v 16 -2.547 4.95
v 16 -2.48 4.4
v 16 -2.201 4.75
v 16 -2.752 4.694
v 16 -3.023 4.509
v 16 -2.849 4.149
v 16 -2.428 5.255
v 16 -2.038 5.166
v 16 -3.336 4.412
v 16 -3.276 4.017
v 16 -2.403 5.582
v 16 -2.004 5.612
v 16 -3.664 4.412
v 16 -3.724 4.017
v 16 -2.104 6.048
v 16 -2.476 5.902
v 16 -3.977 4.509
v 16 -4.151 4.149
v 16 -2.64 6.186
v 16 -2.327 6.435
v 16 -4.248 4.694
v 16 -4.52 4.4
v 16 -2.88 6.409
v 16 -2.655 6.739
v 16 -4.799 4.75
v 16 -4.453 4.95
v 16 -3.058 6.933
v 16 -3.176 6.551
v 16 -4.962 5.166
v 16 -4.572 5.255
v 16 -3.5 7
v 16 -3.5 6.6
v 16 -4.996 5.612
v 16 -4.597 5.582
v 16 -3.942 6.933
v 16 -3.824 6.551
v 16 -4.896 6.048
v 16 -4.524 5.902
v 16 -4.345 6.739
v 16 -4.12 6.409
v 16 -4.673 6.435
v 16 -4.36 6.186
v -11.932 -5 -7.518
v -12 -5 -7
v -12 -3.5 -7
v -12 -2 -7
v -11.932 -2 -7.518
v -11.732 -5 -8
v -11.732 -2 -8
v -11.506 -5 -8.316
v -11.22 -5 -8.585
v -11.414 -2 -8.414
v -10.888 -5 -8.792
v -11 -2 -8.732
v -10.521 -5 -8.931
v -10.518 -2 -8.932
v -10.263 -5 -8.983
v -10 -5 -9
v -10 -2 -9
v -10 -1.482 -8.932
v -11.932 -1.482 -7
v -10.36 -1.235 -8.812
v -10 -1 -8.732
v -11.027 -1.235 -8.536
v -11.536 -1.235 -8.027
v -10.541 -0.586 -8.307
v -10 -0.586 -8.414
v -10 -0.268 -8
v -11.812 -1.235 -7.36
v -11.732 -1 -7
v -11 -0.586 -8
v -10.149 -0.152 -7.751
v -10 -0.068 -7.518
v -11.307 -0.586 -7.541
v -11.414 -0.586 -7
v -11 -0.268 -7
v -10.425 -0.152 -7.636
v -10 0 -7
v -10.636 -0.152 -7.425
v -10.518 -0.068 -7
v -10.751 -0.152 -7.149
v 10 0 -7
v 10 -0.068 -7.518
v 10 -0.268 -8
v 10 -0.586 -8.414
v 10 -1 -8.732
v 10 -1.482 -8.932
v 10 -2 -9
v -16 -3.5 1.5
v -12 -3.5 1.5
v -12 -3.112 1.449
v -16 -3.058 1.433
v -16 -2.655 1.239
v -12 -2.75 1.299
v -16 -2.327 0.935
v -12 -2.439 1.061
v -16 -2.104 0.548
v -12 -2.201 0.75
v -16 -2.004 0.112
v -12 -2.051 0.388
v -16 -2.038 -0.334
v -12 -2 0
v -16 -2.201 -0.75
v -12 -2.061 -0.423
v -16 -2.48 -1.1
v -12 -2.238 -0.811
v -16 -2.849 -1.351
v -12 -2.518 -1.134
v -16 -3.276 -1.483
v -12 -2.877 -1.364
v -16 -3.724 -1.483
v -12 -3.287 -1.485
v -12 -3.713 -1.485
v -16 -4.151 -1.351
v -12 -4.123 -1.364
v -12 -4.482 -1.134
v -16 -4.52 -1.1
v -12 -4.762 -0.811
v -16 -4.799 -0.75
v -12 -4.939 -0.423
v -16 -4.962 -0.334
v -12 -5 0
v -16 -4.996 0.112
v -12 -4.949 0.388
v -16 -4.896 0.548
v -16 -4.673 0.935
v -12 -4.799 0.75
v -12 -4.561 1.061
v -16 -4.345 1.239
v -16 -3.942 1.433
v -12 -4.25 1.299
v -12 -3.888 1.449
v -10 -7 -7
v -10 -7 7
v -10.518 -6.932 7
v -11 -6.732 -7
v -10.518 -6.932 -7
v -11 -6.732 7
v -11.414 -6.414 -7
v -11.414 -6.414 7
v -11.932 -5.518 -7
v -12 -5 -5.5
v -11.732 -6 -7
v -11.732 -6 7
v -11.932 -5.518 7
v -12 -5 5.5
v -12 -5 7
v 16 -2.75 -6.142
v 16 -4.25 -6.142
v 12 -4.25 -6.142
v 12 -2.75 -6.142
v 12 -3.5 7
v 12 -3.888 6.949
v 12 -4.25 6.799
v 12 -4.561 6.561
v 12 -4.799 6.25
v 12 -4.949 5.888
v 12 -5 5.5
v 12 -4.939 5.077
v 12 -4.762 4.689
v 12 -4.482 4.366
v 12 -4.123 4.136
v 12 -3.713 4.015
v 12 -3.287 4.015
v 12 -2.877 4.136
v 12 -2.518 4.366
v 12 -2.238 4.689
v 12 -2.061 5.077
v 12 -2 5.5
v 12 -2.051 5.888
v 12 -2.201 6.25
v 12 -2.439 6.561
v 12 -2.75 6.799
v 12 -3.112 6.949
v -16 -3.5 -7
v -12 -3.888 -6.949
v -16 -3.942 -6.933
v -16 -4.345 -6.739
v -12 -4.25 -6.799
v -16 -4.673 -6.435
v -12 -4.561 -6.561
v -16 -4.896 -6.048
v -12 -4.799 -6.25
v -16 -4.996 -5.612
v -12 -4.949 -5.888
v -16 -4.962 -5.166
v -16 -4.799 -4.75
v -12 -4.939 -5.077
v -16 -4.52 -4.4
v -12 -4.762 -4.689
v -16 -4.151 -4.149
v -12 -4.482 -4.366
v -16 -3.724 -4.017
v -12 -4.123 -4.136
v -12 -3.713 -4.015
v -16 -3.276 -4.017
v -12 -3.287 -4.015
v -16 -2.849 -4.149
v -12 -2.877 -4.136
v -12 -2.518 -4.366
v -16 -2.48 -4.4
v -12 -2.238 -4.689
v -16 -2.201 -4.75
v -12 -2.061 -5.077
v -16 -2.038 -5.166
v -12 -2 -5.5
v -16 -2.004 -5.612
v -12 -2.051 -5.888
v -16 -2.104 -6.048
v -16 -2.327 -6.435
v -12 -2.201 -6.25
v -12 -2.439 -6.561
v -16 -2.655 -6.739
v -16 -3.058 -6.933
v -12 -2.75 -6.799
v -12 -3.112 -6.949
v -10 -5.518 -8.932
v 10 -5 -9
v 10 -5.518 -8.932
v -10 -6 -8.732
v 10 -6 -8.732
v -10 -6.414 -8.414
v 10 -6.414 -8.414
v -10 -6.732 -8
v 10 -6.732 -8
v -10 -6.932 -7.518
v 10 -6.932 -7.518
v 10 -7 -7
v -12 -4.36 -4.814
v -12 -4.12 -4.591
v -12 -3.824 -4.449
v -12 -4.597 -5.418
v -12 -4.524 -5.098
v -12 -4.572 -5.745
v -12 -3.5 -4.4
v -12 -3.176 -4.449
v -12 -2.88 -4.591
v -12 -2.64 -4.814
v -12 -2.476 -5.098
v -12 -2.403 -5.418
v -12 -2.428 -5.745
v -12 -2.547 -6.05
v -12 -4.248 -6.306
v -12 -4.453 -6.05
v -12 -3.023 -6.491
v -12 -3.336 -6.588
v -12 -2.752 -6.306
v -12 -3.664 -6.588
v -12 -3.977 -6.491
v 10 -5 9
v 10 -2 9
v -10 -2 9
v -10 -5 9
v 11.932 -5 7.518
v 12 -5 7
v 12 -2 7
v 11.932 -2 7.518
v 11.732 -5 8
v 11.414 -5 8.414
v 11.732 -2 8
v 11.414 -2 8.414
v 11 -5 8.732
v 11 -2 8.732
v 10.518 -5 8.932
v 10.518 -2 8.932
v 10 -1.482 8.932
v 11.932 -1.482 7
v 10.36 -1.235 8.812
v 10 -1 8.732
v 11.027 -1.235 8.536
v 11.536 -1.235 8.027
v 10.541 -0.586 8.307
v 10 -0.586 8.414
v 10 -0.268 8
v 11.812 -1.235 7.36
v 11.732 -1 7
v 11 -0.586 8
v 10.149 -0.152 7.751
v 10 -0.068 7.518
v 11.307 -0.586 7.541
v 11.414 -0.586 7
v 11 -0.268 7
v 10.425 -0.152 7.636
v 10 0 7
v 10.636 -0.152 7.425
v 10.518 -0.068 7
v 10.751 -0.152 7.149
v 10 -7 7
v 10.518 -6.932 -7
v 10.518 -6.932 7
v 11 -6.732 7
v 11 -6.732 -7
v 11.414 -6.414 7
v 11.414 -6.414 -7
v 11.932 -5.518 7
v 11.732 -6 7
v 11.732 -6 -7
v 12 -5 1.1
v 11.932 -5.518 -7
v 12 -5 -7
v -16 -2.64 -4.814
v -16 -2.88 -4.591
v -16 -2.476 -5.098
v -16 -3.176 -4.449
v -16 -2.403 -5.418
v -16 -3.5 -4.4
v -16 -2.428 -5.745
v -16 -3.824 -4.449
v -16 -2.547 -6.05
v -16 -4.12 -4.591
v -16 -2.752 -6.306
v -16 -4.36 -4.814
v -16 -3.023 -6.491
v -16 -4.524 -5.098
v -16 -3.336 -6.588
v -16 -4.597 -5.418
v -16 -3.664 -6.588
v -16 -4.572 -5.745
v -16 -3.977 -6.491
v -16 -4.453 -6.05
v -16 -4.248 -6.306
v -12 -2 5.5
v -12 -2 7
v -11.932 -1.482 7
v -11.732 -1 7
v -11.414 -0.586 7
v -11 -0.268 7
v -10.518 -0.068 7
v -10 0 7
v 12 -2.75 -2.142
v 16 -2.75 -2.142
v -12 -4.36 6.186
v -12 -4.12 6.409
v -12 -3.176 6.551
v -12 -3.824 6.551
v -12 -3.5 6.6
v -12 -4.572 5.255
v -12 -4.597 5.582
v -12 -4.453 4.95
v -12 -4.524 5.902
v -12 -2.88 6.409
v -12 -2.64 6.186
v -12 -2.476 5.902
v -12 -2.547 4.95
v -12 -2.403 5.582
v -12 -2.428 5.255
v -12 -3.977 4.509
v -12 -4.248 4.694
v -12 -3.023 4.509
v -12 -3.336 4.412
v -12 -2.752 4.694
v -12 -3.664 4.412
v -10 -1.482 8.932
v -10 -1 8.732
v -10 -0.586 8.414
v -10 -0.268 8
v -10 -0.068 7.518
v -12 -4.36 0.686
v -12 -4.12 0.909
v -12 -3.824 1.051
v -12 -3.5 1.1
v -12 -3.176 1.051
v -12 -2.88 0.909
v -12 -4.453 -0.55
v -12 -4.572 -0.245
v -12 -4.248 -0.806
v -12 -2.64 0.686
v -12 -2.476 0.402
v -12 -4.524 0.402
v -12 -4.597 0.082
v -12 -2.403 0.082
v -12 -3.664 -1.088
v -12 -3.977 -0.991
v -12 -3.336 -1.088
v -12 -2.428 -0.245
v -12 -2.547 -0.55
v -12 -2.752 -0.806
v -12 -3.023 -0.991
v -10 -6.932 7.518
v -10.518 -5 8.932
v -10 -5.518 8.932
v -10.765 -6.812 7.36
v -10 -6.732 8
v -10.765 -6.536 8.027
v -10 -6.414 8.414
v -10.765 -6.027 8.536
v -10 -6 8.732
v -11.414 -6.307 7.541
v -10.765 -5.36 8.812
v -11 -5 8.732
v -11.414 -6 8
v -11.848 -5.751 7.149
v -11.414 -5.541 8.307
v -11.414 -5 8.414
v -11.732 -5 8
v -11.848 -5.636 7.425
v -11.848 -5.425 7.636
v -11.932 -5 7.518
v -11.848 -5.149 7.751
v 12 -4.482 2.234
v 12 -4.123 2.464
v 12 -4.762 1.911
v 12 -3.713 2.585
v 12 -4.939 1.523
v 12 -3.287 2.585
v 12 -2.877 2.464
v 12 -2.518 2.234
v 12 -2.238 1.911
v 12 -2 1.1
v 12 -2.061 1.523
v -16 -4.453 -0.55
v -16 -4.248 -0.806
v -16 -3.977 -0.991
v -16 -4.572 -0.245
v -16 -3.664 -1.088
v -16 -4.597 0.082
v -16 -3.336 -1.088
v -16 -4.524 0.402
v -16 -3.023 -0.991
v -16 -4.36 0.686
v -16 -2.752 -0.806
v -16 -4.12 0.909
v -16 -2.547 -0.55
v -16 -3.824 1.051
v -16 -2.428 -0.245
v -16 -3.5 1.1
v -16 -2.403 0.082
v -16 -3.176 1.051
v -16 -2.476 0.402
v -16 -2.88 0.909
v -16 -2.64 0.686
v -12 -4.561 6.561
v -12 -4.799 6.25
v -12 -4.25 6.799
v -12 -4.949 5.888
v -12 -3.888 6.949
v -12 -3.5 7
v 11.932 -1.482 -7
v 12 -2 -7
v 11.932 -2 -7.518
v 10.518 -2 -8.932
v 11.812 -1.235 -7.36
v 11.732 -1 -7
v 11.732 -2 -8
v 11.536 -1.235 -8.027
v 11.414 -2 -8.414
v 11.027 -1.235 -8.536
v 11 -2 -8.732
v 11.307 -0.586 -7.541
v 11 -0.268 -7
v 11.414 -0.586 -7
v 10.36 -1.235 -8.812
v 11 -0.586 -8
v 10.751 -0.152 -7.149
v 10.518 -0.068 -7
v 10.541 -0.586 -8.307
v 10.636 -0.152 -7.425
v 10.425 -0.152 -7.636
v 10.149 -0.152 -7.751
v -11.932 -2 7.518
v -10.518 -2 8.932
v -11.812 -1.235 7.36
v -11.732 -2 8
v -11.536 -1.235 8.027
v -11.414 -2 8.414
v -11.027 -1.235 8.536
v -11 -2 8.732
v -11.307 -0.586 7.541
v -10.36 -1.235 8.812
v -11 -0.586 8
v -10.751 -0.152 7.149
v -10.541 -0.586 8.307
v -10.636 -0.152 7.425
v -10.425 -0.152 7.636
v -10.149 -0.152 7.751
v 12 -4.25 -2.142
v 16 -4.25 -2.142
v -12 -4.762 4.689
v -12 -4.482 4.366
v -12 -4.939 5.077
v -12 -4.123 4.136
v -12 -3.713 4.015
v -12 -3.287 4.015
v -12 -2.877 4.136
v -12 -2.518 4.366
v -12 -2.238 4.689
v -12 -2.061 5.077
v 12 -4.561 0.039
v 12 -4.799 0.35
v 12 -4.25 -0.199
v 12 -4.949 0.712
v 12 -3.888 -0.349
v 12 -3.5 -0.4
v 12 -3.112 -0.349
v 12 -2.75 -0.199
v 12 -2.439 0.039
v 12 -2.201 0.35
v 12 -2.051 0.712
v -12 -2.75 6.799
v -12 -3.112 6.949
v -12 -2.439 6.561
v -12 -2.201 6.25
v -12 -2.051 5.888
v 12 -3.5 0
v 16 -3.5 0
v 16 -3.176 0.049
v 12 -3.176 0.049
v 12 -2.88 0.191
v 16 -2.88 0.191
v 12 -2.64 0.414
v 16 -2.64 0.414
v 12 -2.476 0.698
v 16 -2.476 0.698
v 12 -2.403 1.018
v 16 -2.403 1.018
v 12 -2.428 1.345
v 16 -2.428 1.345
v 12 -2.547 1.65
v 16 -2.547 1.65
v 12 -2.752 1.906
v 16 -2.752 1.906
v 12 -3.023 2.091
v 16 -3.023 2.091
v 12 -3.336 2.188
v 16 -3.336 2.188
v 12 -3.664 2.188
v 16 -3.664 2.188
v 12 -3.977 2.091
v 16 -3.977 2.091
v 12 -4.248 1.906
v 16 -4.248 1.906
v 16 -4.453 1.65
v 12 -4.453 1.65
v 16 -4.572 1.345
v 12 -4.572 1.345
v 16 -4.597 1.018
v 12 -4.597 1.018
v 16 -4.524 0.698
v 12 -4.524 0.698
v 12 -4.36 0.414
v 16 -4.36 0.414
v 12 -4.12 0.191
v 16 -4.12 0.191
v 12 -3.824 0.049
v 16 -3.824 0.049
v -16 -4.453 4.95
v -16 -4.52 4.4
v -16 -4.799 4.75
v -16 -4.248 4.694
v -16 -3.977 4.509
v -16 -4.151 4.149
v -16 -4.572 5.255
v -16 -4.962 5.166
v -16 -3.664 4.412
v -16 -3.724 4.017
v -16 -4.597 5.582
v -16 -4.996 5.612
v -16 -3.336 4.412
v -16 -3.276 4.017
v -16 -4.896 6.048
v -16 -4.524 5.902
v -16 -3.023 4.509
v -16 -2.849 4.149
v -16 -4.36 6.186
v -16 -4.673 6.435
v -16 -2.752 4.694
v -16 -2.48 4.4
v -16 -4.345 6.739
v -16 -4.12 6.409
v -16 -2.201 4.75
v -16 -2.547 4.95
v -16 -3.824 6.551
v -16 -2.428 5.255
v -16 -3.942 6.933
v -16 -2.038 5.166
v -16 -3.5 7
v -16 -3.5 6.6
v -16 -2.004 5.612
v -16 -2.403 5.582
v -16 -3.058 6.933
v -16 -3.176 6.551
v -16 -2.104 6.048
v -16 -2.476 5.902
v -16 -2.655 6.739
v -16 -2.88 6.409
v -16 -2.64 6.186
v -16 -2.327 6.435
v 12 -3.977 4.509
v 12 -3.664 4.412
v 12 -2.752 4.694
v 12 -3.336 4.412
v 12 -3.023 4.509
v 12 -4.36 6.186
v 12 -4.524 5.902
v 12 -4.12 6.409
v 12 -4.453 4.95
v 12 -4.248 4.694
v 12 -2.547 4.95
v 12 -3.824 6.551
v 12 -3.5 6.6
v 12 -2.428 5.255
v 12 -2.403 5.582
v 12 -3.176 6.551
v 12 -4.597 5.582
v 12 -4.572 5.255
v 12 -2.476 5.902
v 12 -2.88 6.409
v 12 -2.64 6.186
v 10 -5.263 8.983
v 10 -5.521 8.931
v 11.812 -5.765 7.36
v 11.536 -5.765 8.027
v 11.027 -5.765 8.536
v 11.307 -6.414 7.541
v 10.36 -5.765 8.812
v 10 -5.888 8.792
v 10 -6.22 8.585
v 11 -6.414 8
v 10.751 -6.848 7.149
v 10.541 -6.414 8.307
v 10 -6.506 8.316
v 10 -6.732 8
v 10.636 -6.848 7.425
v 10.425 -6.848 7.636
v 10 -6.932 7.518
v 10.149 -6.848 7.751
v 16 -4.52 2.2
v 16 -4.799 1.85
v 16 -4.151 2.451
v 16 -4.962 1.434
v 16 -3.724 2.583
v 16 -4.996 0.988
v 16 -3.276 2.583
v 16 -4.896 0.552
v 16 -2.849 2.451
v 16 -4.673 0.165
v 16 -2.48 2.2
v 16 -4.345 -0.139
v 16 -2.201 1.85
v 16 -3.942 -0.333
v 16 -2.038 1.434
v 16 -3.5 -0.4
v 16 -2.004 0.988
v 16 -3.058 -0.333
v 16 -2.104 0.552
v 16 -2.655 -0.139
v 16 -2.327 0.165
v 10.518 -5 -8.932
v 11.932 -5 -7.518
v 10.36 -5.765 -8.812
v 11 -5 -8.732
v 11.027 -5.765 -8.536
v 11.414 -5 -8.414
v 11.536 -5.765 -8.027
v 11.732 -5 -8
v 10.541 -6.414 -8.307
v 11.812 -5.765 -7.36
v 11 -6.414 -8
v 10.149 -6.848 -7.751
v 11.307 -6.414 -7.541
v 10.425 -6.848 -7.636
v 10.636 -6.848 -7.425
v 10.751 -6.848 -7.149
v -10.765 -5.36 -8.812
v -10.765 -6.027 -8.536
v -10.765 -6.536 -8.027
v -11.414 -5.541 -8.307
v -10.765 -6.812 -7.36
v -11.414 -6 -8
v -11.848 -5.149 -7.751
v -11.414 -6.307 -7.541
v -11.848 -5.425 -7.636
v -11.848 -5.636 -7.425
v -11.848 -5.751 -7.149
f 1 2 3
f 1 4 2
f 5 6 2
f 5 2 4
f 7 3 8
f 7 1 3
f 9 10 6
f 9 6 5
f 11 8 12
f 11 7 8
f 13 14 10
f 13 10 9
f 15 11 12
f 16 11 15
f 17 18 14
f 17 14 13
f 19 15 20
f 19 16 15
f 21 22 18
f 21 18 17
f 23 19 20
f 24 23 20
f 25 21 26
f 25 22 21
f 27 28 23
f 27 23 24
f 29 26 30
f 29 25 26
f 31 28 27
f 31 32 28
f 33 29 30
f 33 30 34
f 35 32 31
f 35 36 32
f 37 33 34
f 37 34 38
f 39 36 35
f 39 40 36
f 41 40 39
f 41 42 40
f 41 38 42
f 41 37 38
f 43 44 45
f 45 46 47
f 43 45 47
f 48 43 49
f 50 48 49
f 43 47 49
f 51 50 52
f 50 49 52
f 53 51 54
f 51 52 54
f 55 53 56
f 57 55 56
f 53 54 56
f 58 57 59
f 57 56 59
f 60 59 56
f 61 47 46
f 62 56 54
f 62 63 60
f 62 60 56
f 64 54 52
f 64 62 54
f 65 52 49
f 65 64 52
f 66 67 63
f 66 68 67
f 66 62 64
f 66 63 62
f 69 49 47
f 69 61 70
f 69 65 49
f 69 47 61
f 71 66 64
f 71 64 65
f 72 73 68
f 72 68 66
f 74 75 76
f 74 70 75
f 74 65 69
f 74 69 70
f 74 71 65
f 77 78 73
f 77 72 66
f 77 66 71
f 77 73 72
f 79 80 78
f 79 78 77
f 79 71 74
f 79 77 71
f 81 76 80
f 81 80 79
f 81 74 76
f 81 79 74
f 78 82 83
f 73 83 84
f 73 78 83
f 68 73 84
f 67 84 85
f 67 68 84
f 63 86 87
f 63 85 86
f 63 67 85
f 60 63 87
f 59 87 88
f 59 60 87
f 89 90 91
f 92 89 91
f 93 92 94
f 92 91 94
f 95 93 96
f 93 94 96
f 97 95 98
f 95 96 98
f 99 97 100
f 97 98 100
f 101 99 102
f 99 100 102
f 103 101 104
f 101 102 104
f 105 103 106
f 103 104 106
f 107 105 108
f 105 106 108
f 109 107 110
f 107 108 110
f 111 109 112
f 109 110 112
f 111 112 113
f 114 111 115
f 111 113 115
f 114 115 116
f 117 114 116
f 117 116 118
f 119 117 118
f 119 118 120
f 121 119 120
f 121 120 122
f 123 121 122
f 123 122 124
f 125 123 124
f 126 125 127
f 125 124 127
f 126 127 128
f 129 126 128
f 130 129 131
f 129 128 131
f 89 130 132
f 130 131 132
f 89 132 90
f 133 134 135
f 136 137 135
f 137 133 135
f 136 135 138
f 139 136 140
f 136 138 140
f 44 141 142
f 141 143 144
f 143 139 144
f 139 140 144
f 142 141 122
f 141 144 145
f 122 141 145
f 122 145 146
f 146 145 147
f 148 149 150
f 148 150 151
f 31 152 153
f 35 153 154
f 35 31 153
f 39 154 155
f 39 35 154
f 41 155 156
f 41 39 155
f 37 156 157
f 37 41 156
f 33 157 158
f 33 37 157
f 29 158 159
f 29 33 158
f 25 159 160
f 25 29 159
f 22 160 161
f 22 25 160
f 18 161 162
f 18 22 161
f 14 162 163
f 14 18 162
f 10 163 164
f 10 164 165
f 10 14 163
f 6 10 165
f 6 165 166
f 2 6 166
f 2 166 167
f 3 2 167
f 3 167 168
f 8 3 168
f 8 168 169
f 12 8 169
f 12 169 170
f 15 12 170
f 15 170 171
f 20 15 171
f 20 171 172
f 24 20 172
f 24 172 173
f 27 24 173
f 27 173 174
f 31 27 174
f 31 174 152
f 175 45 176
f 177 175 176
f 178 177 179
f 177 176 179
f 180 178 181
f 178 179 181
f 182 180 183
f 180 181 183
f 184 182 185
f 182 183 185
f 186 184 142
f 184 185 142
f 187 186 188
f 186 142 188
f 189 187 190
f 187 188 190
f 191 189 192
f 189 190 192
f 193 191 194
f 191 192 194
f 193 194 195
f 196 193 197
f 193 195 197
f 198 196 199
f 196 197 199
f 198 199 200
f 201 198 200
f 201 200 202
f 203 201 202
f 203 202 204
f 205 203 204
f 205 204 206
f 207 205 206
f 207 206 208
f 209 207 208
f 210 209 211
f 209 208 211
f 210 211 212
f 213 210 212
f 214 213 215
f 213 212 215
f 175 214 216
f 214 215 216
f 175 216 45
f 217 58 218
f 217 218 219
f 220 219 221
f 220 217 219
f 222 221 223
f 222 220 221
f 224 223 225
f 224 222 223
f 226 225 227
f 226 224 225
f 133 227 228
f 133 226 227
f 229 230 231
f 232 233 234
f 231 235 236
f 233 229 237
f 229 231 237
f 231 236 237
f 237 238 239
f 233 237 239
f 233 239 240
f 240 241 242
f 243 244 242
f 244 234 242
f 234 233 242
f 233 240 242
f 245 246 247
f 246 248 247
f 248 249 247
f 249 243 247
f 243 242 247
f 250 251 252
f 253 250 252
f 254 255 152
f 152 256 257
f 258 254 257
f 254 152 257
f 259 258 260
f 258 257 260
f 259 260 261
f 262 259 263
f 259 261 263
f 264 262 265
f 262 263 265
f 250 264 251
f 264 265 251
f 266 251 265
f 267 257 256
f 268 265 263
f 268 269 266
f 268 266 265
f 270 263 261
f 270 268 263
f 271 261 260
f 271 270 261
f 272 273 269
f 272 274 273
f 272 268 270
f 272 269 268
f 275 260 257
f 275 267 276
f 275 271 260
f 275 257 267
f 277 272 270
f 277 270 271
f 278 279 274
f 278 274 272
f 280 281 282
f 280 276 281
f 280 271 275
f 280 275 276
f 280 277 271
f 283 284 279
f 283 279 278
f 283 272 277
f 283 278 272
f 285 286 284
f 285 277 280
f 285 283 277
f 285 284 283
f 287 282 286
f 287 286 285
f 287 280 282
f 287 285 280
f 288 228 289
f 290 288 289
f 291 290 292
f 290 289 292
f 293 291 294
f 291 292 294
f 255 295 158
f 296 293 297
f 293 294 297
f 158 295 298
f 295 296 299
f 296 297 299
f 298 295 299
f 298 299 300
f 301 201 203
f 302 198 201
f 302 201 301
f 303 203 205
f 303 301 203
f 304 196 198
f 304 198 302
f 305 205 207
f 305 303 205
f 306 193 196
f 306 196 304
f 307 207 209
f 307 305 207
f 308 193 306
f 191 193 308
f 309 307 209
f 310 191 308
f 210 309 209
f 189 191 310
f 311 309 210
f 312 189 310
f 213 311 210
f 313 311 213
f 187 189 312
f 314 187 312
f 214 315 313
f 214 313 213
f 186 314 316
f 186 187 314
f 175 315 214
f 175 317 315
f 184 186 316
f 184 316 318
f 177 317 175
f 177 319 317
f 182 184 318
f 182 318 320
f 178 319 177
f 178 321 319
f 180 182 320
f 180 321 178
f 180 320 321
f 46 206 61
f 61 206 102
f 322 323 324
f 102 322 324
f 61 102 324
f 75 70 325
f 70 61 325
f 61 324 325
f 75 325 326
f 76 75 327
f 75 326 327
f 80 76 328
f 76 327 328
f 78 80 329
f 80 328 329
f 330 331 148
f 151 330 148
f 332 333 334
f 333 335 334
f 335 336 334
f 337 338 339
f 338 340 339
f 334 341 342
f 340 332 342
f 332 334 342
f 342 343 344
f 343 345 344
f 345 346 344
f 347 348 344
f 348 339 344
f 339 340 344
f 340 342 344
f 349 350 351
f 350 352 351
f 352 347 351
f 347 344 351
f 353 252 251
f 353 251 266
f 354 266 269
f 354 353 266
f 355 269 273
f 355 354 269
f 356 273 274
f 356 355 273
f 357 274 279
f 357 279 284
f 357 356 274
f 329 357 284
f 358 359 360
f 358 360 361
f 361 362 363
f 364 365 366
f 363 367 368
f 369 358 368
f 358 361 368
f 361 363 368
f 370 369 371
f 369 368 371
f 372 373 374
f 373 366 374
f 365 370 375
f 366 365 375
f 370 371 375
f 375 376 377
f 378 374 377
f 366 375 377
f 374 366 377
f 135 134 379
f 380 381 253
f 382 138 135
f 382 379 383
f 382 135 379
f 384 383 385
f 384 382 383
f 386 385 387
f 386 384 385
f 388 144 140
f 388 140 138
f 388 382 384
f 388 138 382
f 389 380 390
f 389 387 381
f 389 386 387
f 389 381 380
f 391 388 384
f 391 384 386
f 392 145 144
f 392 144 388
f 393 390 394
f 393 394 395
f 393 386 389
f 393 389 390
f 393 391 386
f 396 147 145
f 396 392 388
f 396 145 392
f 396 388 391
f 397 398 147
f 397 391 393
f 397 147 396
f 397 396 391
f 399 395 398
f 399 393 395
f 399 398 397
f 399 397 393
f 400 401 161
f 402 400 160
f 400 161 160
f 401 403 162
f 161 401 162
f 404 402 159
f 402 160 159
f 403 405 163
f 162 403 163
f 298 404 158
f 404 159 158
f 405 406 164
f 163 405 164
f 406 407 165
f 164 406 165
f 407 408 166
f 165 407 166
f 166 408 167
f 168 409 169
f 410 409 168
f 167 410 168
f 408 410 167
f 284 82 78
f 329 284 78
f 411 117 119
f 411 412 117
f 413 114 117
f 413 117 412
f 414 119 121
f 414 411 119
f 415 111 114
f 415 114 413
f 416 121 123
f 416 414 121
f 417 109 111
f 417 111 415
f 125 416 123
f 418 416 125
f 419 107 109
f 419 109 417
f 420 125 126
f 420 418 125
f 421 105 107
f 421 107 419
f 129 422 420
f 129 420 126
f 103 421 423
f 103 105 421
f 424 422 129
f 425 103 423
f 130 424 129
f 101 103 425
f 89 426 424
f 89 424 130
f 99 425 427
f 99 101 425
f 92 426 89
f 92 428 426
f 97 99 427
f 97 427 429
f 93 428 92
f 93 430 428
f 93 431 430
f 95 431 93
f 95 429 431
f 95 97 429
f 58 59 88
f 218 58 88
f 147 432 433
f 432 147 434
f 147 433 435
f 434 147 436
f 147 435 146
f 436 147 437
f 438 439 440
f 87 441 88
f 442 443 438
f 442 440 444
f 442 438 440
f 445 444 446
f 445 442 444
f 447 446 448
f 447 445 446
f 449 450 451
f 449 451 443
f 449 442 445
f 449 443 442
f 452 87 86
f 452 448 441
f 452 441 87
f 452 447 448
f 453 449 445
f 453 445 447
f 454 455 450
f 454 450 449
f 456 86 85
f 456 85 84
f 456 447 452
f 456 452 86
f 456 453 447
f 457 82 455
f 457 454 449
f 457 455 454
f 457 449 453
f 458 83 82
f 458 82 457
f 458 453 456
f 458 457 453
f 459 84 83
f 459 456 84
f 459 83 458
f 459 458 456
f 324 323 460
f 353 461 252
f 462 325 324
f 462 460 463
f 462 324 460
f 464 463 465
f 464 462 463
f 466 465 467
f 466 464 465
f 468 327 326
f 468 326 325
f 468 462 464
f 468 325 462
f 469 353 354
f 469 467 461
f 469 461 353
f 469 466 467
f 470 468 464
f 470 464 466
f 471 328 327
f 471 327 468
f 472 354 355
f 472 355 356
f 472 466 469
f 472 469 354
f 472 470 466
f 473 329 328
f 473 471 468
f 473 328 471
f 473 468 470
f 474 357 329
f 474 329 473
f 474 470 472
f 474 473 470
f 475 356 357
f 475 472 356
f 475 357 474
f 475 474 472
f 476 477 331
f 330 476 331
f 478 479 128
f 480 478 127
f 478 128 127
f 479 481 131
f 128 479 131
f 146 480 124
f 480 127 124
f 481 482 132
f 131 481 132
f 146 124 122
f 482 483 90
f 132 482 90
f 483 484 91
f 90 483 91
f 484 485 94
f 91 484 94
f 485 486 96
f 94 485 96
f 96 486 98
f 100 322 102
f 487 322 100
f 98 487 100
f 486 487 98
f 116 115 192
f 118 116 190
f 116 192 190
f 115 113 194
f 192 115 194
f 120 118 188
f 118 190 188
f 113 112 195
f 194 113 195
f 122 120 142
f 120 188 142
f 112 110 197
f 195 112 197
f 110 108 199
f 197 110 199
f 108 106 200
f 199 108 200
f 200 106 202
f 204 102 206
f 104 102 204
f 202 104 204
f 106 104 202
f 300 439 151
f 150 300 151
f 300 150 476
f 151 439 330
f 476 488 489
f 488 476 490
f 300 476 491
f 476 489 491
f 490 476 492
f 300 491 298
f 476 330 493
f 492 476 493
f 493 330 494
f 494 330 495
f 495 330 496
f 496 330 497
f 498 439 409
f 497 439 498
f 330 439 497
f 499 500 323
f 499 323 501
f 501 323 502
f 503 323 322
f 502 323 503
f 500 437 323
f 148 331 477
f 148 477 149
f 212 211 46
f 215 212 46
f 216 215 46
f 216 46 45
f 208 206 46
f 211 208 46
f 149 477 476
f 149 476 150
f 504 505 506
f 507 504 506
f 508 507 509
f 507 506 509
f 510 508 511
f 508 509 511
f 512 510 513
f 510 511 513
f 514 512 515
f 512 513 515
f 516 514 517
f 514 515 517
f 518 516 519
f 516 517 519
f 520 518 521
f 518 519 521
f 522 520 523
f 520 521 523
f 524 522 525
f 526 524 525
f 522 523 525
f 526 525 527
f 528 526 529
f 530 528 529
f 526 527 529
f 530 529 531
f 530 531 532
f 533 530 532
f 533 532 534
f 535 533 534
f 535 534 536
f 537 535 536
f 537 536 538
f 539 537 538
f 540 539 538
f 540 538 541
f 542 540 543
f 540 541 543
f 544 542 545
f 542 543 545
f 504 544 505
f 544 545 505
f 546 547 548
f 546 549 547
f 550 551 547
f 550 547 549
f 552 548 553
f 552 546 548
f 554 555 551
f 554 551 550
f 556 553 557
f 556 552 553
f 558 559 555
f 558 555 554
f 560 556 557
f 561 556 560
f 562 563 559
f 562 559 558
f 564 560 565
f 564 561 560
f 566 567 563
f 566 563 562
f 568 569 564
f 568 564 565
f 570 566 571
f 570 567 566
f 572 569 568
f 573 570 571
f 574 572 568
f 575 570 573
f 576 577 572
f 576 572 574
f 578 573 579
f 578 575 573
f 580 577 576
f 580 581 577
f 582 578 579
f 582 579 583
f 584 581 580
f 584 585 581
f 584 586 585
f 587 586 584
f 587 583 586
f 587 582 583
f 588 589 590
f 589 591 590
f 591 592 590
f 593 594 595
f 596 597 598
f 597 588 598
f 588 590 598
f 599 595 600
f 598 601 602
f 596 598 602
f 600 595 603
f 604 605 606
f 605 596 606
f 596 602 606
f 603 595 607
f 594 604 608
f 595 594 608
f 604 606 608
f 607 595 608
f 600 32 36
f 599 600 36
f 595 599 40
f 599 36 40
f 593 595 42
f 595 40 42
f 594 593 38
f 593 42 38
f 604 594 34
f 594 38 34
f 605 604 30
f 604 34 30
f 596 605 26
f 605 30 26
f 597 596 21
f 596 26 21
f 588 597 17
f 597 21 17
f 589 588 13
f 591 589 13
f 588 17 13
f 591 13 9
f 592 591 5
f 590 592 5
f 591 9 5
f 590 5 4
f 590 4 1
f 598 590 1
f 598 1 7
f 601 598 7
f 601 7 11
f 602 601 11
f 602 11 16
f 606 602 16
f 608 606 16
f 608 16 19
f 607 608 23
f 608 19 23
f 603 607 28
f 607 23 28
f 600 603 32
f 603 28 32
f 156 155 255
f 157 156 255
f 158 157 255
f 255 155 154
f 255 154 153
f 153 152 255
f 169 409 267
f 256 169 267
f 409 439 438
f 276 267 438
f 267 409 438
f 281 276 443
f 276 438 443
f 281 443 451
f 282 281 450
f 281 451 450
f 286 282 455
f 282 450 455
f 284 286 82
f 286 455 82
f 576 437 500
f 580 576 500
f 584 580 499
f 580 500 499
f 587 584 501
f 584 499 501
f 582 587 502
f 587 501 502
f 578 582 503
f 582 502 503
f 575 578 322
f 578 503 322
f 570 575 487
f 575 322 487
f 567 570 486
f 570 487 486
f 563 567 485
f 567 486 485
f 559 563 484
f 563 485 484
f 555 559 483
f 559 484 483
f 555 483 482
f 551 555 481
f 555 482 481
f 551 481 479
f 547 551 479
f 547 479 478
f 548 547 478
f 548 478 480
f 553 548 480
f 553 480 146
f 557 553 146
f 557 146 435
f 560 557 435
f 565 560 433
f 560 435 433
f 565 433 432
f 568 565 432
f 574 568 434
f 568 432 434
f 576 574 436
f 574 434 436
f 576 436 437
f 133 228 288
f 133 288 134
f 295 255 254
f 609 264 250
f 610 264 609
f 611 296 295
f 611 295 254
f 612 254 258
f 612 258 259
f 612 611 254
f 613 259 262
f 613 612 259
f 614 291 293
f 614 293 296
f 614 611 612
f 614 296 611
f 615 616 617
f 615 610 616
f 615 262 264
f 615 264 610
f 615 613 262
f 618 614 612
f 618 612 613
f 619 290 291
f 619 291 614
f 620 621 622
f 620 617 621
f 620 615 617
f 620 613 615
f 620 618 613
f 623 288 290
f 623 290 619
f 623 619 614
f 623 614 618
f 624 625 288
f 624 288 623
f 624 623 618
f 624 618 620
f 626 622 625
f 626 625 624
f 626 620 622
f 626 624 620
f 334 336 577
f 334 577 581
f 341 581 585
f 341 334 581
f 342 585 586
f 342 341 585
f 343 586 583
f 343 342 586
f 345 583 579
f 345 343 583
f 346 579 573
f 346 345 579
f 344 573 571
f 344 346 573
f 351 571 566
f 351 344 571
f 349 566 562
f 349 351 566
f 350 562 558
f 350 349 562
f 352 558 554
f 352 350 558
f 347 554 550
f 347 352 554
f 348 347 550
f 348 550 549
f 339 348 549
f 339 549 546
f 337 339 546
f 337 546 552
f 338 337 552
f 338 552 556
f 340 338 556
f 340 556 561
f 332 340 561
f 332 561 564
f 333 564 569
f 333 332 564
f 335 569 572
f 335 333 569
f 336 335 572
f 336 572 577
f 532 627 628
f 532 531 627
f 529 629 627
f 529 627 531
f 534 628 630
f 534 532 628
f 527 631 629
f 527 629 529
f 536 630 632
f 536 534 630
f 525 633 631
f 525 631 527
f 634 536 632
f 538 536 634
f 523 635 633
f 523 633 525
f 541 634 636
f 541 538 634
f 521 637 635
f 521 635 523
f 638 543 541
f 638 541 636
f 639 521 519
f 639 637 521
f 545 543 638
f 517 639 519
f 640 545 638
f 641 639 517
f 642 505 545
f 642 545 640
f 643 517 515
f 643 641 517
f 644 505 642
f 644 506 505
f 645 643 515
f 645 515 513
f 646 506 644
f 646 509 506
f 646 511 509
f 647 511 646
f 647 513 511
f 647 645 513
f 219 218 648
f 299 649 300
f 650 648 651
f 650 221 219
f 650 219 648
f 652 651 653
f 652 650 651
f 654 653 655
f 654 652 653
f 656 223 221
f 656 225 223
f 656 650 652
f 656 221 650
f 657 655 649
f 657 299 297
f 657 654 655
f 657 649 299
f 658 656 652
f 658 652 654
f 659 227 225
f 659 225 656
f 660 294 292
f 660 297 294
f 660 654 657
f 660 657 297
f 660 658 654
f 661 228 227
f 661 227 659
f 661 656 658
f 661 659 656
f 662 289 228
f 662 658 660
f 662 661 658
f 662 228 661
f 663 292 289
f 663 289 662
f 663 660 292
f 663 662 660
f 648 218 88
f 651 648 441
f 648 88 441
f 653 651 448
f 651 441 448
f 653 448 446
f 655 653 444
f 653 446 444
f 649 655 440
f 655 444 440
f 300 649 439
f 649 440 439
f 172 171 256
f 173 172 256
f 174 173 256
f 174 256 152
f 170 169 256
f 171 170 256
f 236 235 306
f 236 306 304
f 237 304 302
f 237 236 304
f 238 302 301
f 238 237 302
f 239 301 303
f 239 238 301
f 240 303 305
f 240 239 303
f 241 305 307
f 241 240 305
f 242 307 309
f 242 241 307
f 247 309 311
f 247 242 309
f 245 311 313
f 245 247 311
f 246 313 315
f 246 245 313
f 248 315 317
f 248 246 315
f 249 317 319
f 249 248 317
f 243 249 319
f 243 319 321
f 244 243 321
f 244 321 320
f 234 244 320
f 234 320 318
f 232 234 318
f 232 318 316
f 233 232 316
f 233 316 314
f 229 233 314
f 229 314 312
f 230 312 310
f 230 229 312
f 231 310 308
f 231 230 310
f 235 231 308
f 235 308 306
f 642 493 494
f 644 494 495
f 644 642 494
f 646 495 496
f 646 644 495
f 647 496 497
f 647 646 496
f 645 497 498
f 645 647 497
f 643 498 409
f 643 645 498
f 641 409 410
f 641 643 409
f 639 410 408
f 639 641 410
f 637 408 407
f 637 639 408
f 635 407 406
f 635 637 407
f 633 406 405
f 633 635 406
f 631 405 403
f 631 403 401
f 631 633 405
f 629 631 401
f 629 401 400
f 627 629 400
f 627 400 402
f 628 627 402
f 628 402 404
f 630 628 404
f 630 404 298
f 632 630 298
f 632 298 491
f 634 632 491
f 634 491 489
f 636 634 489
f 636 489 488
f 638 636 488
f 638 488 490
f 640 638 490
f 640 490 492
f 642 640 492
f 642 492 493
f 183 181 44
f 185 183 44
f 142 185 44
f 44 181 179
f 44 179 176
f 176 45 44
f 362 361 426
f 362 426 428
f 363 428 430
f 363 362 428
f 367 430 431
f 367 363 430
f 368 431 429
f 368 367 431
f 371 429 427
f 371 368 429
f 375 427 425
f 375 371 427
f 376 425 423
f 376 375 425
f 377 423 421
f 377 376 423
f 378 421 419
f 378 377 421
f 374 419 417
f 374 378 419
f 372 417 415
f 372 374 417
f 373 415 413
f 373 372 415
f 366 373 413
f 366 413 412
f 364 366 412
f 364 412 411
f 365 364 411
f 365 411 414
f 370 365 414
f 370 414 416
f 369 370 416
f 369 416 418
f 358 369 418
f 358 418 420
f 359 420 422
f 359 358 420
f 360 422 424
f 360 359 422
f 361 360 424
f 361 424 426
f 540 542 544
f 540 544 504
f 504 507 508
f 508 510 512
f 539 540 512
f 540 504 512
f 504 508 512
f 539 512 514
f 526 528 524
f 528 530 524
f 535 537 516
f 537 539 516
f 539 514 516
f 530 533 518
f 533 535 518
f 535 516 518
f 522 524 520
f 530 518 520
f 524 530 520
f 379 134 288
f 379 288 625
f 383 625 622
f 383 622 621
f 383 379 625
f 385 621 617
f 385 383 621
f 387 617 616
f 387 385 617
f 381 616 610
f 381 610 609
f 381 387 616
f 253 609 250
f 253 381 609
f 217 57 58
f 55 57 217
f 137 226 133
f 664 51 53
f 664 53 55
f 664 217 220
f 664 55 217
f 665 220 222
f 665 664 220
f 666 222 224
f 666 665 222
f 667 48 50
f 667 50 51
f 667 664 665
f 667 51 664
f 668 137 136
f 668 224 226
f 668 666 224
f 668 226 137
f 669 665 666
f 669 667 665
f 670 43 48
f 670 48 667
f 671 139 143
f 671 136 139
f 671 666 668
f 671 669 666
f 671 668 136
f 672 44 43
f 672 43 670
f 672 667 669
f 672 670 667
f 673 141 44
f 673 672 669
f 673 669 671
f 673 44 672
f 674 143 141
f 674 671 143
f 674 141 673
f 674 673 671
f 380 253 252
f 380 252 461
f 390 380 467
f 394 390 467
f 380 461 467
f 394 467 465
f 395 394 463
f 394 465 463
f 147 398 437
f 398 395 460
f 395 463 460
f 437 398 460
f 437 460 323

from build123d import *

# Parameters (mm, degrees)
BOSS_EXTRUDE1_DEPTH = 7
CUT_EXTRUDE3_DEPTH  = 27.570660511
SKETCH7_R           = 1.5
SKETCH7_R_2         = 1.1
BOSS_EXTRUDE3_DEPTH = 4
BOSS_EXTRUDE4_START = 4
SKETCH8_R           = 1.5
SKETCH8_R_2         = 1.1
SKETCH8_W           = 4
SKETCH8_H           = 1.5
BOSS_EXTRUDE4_DEPTH = 4
FILLET1_R           = 2


with BuildPart() as part:
    # Sketch1 → Boss-Extrude1 (new body)
    with BuildSketch(Plane(origin=(0, 0, 0), x_dir=(1, 0, 0), z_dir=(0, 1, 0))):
        with BuildLine():
            Line((10, -9), (-10, -9))
            ThreePointArc((-10, -9), (-11.414213562, -8.414213562), (-12, -7))
            Line((-12, -7), (-12, 7))
            ThreePointArc((-12, 7), (-11.414213562, 8.414213562), (-10, 9))
            Line((-10, 9), (10, 9))
            ThreePointArc((10, 9), (11.414213562, 8.414213562), (12, 7))
            Line((12, 7), (12, -7))
            ThreePointArc((12, -7), (11.414213562, -8.414213562), (10, -9))
        make_face()
    extrude(amount=-BOSS_EXTRUDE1_DEPTH)

    # Sketch5 → Cut-Extrude3 (cut, through all)
    with BuildSketch(Plane.ZY.offset(12)):
        with BuildLine():
            ThreePointArc((-7, 0), (-8.414213562, -0.585786438), (-9, -2))
            Line((-9, -2), (-9, 0))
            Line((-9, 0), (-7, 0))
        make_face()
        with BuildLine():
            ThreePointArc((-9, -5), (-8.414213562, -6.414213562), (-7, -7))
            Line((-7, -7), (-9, -7))
            Line((-9, -7), (-9, -5))
        make_face()
        with BuildLine():
            ThreePointArc((7, -7), (8.414213562, -6.414213562), (9, -5))
            Line((9, -5), (9, -7))
            Line((9, -7), (7, -7))
        make_face()
        with BuildLine():
            Line((7, 0), (9, 0))
            Line((9, 0), (9, -2))
            ThreePointArc((9, -2), (8.414213562, -0.585786438), (7, 0))
        make_face()
    extrude(amount=-CUT_EXTRUDE3_DEPTH, mode=Mode.SUBTRACT)

    # Sketch7 → Boss-Extrude3 (add)
    # profile 1 of 3: a face of its own
    with BuildSketch(Plane.ZY.offset(12)):
        with Locations(Location((-5.5, -3.5, 0), (0, 0, 180))):
            Circle(SKETCH7_R)
        with Locations((-5.5, -3.5)):
            Circle(SKETCH7_R_2, mode=Mode.SUBTRACT)
    # profile 2 of 3: a face of its own
    with BuildSketch(Plane.ZY.offset(12)):
        with Locations((0, -3.5)):
            Circle(SKETCH7_R)
        with Locations((0, -3.5)):
            Circle(SKETCH7_R_2, mode=Mode.SUBTRACT)
    # profile 3 of 3: a face of its own
    with BuildSketch(Plane.ZY.offset(12)):
        with Locations((5.5, -3.5)):
            Circle(SKETCH7_R)
        with Locations((5.5, -3.5)):
            Circle(SKETCH7_R_2, mode=Mode.SUBTRACT)
    extrude(amount=BOSS_EXTRUDE3_DEPTH)

    # Sketch8 → Boss-Extrude4 (add)
    # profile 1 of 3: a face of its own
    with BuildSketch(Plane(origin=(12, 0, 0), x_dir=(0, 0, -1), z_dir=(1, 0, 0)).offset(BOSS_EXTRUDE4_START)):
        with Locations(Location((-5.5, -3.5, 0), (0, 0, 180))):
            Circle(SKETCH8_R)
        with Locations(Location((-5.5, -3.5, 0), (0, 0, 180))):
            Circle(SKETCH8_R_2, mode=Mode.SUBTRACT)
    # profile 2 of 3: a face of its own
    with BuildSketch(Plane(origin=(12, 0, 0), x_dir=(0, 0, -1), z_dir=(1, 0, 0)).offset(BOSS_EXTRUDE4_START)):
        with Locations((-1.1, -3.5)):
            Circle(SKETCH8_R)
        with Locations((-1.1, -3.5)):
            Circle(SKETCH8_R_2, mode=Mode.SUBTRACT)
    # profile 3 of 3: a face of its own
    with BuildSketch(Plane(origin=(12, 0, 0), x_dir=(0, 0, -1), z_dir=(1, 0, 0)).offset(BOSS_EXTRUDE4_START)):
        with Locations((4.14210092, -3.5)):
            Rectangle(SKETCH8_W, SKETCH8_H)
    extrude(amount=-BOSS_EXTRUDE4_DEPTH)

    # Fillet1
    # the kernel refuses this fillet: 2 mm, written as the material it takes off along each edge
    with BuildSketch(Plane(origin=(10, -2, 7), x_dir=(1, 0, 0), z_dir=(0, 1, 0))) as fillet1_piece_1_section:
        Polygon((0, 0), (FILLET1_R, 0), (FILLET1_R, -FILLET1_R), (0, -FILLET1_R), align=None)
    fillet1_piece_1 = extrude(amount=FILLET1_R, mode=Mode.PRIVATE)
    fillet1_piece_1 = fillet1_piece_1 - Plane(origin=(10, -2, 7), x_dir=(-0.7071067811865475, 0, -0.7071067811865475), z_dir=(0, 1, 0)) * Sphere(FILLET1_R, mode=Mode.PRIVATE)
    add(fillet1_piece_1, mode=Mode.SUBTRACT)
    with BuildSketch(Plane(origin=(-10, -2, 7), x_dir=(-1, 0, 0), z_dir=(0, 1, 0))) as fillet1_piece_2_section:
        Polygon((0, 0), (FILLET1_R, 0), (FILLET1_R, FILLET1_R), (0, FILLET1_R), align=None)
    fillet1_piece_2 = extrude(amount=FILLET1_R, mode=Mode.PRIVATE)
    fillet1_piece_2 = fillet1_piece_2 - Plane(origin=(-10, -2, 7), x_dir=(0.7071067811865475, 0, -0.7071067811865475), z_dir=(0, 1, 0)) * Sphere(FILLET1_R, mode=Mode.PRIVATE)
    add(fillet1_piece_2, mode=Mode.SUBTRACT)
    with BuildSketch(Plane(origin=(10, -5, 7), x_dir=(1, 0, 0), z_dir=(0, -1, 0))) as fillet1_piece_3_section:
        Polygon((0, 0), (FILLET1_R, 0), (FILLET1_R, FILLET1_R), (0, FILLET1_R), align=None)
    fillet1_piece_3 = extrude(amount=FILLET1_R, mode=Mode.PRIVATE)
    fillet1_piece_3 = fillet1_piece_3 - Plane(origin=(10, -5, 7), x_dir=(-0.7071067811865475, 0, -0.7071067811865475), z_dir=(0, -1, 0)) * Sphere(FILLET1_R, mode=Mode.PRIVATE)
    add(fillet1_piece_3, mode=Mode.SUBTRACT)
    with BuildSketch(Plane(origin=(-10, -5, 7), x_dir=(0, -1, 0), z_dir=(-1, 0, 0))) as fillet1_piece_4_section:
        Polygon((0, 0), (FILLET1_R, 0), (FILLET1_R, FILLET1_R), (0, FILLET1_R), align=None)
    fillet1_piece_4 = extrude(amount=FILLET1_R, mode=Mode.PRIVATE)
    fillet1_piece_4 = fillet1_piece_4 - Plane(origin=(-10, -5, 7), x_dir=(0, 0.7071067811865475, -0.7071067811865475), z_dir=(-1, 0, 0)) * Sphere(FILLET1_R, mode=Mode.PRIVATE)
    add(fillet1_piece_4, mode=Mode.SUBTRACT)
    with BuildSketch(Plane(origin=(10, -5, -7), x_dir=(1, 0, 0), z_dir=(0, -1, 0))) as fillet1_piece_5_section:
        Polygon((0, 0), (FILLET1_R, 0), (FILLET1_R, -FILLET1_R), (0, -FILLET1_R), align=None)
    fillet1_piece_5 = extrude(amount=FILLET1_R, mode=Mode.PRIVATE)
    fillet1_piece_5 = fillet1_piece_5 - Plane(origin=(10, -5, -7), x_dir=(-0.7071067811865475, 0, 0.7071067811865476), z_dir=(0, -1, 0)) * Sphere(FILLET1_R, mode=Mode.PRIVATE)
    add(fillet1_piece_5, mode=Mode.SUBTRACT)
    with BuildSketch(Plane(origin=(-10, -5, -7), x_dir=(0, -1, 0), z_dir=(-1, 0, 0))) as fillet1_piece_6_section:
        Polygon((0, 0), (FILLET1_R, 0), (FILLET1_R, -FILLET1_R), (0, -FILLET1_R), align=None)
    fillet1_piece_6 = extrude(amount=FILLET1_R, mode=Mode.PRIVATE)
    fillet1_piece_6 = fillet1_piece_6 - Plane(origin=(-10, -5, -7), x_dir=(0, 0.7071067811865475, 0.7071067811865475), z_dir=(-1, 0, 0)) * Sphere(FILLET1_R, mode=Mode.PRIVATE)
    add(fillet1_piece_6, mode=Mode.SUBTRACT)
    with BuildSketch(Plane(origin=(10, -2, -7), x_dir=(1, 0, 0), z_dir=(0, 1, 0))) as fillet1_piece_7_section:
        Polygon((0, 0), (FILLET1_R, 0), (FILLET1_R, FILLET1_R), (0, FILLET1_R), align=None)
    fillet1_piece_7 = extrude(amount=FILLET1_R, mode=Mode.PRIVATE)
    fillet1_piece_7 = fillet1_piece_7 - Plane(origin=(10, -2, -7), x_dir=(-0.7071067811865475, 0, 0.7071067811865476), z_dir=(0, 1, 0)) * Sphere(FILLET1_R, mode=Mode.PRIVATE)
    add(fillet1_piece_7, mode=Mode.SUBTRACT)
    with BuildSketch(Plane(origin=(-10, -2, -7), x_dir=(-1, 0, 0), z_dir=(0, 1, 0))) as fillet1_piece_8_section:
        Polygon((0, 0), (FILLET1_R, 0), (FILLET1_R, -FILLET1_R), (0, -FILLET1_R), align=None)
    fillet1_piece_8 = extrude(amount=FILLET1_R, mode=Mode.PRIVATE)
    fillet1_piece_8 = fillet1_piece_8 - Plane(origin=(-10, -2, -7), x_dir=(0.7071067811865475, 0, 0.7071067811865475), z_dir=(0, 1, 0)) * Sphere(FILLET1_R, mode=Mode.PRIVATE)
    add(fillet1_piece_8, mode=Mode.SUBTRACT)
    with BuildSketch(Plane(origin=(-12, 0, 7), x_dir=(1, 0, 0), z_dir=(0, 0, -1)), Plane(origin=(-12, -7, 7), x_dir=(0, 1, 0), z_dir=(0, 0, -1)), Plane(origin=(12, 0, -7), x_dir=(-1, 0, 0), z_dir=(0, 0, 1))) as fillet1_piece_9:
        with BuildLine():
            CenterArc((FILLET1_R, FILLET1_R), FILLET1_R, 180, 90)
            Line((0, FILLET1_R), (0, 0))
            Line((0, 0), (FILLET1_R, 0))
        make_face()
    extrude(amount=14, mode=Mode.SUBTRACT)
    with BuildSketch(Plane(origin=(12, -7, -7), x_dir=(-1, 0, 0), z_dir=(0, 0, 1))) as fillet1_piece_10:
        with BuildLine():
            CenterArc((FILLET1_R, -FILLET1_R), FILLET1_R, 90, 90)
            Line((0, -FILLET1_R), (0, 0))
            Line((0, 0), (FILLET1_R, 0))
        make_face()
    extrude(amount=14, mode=Mode.SUBTRACT)


solid = part.part
